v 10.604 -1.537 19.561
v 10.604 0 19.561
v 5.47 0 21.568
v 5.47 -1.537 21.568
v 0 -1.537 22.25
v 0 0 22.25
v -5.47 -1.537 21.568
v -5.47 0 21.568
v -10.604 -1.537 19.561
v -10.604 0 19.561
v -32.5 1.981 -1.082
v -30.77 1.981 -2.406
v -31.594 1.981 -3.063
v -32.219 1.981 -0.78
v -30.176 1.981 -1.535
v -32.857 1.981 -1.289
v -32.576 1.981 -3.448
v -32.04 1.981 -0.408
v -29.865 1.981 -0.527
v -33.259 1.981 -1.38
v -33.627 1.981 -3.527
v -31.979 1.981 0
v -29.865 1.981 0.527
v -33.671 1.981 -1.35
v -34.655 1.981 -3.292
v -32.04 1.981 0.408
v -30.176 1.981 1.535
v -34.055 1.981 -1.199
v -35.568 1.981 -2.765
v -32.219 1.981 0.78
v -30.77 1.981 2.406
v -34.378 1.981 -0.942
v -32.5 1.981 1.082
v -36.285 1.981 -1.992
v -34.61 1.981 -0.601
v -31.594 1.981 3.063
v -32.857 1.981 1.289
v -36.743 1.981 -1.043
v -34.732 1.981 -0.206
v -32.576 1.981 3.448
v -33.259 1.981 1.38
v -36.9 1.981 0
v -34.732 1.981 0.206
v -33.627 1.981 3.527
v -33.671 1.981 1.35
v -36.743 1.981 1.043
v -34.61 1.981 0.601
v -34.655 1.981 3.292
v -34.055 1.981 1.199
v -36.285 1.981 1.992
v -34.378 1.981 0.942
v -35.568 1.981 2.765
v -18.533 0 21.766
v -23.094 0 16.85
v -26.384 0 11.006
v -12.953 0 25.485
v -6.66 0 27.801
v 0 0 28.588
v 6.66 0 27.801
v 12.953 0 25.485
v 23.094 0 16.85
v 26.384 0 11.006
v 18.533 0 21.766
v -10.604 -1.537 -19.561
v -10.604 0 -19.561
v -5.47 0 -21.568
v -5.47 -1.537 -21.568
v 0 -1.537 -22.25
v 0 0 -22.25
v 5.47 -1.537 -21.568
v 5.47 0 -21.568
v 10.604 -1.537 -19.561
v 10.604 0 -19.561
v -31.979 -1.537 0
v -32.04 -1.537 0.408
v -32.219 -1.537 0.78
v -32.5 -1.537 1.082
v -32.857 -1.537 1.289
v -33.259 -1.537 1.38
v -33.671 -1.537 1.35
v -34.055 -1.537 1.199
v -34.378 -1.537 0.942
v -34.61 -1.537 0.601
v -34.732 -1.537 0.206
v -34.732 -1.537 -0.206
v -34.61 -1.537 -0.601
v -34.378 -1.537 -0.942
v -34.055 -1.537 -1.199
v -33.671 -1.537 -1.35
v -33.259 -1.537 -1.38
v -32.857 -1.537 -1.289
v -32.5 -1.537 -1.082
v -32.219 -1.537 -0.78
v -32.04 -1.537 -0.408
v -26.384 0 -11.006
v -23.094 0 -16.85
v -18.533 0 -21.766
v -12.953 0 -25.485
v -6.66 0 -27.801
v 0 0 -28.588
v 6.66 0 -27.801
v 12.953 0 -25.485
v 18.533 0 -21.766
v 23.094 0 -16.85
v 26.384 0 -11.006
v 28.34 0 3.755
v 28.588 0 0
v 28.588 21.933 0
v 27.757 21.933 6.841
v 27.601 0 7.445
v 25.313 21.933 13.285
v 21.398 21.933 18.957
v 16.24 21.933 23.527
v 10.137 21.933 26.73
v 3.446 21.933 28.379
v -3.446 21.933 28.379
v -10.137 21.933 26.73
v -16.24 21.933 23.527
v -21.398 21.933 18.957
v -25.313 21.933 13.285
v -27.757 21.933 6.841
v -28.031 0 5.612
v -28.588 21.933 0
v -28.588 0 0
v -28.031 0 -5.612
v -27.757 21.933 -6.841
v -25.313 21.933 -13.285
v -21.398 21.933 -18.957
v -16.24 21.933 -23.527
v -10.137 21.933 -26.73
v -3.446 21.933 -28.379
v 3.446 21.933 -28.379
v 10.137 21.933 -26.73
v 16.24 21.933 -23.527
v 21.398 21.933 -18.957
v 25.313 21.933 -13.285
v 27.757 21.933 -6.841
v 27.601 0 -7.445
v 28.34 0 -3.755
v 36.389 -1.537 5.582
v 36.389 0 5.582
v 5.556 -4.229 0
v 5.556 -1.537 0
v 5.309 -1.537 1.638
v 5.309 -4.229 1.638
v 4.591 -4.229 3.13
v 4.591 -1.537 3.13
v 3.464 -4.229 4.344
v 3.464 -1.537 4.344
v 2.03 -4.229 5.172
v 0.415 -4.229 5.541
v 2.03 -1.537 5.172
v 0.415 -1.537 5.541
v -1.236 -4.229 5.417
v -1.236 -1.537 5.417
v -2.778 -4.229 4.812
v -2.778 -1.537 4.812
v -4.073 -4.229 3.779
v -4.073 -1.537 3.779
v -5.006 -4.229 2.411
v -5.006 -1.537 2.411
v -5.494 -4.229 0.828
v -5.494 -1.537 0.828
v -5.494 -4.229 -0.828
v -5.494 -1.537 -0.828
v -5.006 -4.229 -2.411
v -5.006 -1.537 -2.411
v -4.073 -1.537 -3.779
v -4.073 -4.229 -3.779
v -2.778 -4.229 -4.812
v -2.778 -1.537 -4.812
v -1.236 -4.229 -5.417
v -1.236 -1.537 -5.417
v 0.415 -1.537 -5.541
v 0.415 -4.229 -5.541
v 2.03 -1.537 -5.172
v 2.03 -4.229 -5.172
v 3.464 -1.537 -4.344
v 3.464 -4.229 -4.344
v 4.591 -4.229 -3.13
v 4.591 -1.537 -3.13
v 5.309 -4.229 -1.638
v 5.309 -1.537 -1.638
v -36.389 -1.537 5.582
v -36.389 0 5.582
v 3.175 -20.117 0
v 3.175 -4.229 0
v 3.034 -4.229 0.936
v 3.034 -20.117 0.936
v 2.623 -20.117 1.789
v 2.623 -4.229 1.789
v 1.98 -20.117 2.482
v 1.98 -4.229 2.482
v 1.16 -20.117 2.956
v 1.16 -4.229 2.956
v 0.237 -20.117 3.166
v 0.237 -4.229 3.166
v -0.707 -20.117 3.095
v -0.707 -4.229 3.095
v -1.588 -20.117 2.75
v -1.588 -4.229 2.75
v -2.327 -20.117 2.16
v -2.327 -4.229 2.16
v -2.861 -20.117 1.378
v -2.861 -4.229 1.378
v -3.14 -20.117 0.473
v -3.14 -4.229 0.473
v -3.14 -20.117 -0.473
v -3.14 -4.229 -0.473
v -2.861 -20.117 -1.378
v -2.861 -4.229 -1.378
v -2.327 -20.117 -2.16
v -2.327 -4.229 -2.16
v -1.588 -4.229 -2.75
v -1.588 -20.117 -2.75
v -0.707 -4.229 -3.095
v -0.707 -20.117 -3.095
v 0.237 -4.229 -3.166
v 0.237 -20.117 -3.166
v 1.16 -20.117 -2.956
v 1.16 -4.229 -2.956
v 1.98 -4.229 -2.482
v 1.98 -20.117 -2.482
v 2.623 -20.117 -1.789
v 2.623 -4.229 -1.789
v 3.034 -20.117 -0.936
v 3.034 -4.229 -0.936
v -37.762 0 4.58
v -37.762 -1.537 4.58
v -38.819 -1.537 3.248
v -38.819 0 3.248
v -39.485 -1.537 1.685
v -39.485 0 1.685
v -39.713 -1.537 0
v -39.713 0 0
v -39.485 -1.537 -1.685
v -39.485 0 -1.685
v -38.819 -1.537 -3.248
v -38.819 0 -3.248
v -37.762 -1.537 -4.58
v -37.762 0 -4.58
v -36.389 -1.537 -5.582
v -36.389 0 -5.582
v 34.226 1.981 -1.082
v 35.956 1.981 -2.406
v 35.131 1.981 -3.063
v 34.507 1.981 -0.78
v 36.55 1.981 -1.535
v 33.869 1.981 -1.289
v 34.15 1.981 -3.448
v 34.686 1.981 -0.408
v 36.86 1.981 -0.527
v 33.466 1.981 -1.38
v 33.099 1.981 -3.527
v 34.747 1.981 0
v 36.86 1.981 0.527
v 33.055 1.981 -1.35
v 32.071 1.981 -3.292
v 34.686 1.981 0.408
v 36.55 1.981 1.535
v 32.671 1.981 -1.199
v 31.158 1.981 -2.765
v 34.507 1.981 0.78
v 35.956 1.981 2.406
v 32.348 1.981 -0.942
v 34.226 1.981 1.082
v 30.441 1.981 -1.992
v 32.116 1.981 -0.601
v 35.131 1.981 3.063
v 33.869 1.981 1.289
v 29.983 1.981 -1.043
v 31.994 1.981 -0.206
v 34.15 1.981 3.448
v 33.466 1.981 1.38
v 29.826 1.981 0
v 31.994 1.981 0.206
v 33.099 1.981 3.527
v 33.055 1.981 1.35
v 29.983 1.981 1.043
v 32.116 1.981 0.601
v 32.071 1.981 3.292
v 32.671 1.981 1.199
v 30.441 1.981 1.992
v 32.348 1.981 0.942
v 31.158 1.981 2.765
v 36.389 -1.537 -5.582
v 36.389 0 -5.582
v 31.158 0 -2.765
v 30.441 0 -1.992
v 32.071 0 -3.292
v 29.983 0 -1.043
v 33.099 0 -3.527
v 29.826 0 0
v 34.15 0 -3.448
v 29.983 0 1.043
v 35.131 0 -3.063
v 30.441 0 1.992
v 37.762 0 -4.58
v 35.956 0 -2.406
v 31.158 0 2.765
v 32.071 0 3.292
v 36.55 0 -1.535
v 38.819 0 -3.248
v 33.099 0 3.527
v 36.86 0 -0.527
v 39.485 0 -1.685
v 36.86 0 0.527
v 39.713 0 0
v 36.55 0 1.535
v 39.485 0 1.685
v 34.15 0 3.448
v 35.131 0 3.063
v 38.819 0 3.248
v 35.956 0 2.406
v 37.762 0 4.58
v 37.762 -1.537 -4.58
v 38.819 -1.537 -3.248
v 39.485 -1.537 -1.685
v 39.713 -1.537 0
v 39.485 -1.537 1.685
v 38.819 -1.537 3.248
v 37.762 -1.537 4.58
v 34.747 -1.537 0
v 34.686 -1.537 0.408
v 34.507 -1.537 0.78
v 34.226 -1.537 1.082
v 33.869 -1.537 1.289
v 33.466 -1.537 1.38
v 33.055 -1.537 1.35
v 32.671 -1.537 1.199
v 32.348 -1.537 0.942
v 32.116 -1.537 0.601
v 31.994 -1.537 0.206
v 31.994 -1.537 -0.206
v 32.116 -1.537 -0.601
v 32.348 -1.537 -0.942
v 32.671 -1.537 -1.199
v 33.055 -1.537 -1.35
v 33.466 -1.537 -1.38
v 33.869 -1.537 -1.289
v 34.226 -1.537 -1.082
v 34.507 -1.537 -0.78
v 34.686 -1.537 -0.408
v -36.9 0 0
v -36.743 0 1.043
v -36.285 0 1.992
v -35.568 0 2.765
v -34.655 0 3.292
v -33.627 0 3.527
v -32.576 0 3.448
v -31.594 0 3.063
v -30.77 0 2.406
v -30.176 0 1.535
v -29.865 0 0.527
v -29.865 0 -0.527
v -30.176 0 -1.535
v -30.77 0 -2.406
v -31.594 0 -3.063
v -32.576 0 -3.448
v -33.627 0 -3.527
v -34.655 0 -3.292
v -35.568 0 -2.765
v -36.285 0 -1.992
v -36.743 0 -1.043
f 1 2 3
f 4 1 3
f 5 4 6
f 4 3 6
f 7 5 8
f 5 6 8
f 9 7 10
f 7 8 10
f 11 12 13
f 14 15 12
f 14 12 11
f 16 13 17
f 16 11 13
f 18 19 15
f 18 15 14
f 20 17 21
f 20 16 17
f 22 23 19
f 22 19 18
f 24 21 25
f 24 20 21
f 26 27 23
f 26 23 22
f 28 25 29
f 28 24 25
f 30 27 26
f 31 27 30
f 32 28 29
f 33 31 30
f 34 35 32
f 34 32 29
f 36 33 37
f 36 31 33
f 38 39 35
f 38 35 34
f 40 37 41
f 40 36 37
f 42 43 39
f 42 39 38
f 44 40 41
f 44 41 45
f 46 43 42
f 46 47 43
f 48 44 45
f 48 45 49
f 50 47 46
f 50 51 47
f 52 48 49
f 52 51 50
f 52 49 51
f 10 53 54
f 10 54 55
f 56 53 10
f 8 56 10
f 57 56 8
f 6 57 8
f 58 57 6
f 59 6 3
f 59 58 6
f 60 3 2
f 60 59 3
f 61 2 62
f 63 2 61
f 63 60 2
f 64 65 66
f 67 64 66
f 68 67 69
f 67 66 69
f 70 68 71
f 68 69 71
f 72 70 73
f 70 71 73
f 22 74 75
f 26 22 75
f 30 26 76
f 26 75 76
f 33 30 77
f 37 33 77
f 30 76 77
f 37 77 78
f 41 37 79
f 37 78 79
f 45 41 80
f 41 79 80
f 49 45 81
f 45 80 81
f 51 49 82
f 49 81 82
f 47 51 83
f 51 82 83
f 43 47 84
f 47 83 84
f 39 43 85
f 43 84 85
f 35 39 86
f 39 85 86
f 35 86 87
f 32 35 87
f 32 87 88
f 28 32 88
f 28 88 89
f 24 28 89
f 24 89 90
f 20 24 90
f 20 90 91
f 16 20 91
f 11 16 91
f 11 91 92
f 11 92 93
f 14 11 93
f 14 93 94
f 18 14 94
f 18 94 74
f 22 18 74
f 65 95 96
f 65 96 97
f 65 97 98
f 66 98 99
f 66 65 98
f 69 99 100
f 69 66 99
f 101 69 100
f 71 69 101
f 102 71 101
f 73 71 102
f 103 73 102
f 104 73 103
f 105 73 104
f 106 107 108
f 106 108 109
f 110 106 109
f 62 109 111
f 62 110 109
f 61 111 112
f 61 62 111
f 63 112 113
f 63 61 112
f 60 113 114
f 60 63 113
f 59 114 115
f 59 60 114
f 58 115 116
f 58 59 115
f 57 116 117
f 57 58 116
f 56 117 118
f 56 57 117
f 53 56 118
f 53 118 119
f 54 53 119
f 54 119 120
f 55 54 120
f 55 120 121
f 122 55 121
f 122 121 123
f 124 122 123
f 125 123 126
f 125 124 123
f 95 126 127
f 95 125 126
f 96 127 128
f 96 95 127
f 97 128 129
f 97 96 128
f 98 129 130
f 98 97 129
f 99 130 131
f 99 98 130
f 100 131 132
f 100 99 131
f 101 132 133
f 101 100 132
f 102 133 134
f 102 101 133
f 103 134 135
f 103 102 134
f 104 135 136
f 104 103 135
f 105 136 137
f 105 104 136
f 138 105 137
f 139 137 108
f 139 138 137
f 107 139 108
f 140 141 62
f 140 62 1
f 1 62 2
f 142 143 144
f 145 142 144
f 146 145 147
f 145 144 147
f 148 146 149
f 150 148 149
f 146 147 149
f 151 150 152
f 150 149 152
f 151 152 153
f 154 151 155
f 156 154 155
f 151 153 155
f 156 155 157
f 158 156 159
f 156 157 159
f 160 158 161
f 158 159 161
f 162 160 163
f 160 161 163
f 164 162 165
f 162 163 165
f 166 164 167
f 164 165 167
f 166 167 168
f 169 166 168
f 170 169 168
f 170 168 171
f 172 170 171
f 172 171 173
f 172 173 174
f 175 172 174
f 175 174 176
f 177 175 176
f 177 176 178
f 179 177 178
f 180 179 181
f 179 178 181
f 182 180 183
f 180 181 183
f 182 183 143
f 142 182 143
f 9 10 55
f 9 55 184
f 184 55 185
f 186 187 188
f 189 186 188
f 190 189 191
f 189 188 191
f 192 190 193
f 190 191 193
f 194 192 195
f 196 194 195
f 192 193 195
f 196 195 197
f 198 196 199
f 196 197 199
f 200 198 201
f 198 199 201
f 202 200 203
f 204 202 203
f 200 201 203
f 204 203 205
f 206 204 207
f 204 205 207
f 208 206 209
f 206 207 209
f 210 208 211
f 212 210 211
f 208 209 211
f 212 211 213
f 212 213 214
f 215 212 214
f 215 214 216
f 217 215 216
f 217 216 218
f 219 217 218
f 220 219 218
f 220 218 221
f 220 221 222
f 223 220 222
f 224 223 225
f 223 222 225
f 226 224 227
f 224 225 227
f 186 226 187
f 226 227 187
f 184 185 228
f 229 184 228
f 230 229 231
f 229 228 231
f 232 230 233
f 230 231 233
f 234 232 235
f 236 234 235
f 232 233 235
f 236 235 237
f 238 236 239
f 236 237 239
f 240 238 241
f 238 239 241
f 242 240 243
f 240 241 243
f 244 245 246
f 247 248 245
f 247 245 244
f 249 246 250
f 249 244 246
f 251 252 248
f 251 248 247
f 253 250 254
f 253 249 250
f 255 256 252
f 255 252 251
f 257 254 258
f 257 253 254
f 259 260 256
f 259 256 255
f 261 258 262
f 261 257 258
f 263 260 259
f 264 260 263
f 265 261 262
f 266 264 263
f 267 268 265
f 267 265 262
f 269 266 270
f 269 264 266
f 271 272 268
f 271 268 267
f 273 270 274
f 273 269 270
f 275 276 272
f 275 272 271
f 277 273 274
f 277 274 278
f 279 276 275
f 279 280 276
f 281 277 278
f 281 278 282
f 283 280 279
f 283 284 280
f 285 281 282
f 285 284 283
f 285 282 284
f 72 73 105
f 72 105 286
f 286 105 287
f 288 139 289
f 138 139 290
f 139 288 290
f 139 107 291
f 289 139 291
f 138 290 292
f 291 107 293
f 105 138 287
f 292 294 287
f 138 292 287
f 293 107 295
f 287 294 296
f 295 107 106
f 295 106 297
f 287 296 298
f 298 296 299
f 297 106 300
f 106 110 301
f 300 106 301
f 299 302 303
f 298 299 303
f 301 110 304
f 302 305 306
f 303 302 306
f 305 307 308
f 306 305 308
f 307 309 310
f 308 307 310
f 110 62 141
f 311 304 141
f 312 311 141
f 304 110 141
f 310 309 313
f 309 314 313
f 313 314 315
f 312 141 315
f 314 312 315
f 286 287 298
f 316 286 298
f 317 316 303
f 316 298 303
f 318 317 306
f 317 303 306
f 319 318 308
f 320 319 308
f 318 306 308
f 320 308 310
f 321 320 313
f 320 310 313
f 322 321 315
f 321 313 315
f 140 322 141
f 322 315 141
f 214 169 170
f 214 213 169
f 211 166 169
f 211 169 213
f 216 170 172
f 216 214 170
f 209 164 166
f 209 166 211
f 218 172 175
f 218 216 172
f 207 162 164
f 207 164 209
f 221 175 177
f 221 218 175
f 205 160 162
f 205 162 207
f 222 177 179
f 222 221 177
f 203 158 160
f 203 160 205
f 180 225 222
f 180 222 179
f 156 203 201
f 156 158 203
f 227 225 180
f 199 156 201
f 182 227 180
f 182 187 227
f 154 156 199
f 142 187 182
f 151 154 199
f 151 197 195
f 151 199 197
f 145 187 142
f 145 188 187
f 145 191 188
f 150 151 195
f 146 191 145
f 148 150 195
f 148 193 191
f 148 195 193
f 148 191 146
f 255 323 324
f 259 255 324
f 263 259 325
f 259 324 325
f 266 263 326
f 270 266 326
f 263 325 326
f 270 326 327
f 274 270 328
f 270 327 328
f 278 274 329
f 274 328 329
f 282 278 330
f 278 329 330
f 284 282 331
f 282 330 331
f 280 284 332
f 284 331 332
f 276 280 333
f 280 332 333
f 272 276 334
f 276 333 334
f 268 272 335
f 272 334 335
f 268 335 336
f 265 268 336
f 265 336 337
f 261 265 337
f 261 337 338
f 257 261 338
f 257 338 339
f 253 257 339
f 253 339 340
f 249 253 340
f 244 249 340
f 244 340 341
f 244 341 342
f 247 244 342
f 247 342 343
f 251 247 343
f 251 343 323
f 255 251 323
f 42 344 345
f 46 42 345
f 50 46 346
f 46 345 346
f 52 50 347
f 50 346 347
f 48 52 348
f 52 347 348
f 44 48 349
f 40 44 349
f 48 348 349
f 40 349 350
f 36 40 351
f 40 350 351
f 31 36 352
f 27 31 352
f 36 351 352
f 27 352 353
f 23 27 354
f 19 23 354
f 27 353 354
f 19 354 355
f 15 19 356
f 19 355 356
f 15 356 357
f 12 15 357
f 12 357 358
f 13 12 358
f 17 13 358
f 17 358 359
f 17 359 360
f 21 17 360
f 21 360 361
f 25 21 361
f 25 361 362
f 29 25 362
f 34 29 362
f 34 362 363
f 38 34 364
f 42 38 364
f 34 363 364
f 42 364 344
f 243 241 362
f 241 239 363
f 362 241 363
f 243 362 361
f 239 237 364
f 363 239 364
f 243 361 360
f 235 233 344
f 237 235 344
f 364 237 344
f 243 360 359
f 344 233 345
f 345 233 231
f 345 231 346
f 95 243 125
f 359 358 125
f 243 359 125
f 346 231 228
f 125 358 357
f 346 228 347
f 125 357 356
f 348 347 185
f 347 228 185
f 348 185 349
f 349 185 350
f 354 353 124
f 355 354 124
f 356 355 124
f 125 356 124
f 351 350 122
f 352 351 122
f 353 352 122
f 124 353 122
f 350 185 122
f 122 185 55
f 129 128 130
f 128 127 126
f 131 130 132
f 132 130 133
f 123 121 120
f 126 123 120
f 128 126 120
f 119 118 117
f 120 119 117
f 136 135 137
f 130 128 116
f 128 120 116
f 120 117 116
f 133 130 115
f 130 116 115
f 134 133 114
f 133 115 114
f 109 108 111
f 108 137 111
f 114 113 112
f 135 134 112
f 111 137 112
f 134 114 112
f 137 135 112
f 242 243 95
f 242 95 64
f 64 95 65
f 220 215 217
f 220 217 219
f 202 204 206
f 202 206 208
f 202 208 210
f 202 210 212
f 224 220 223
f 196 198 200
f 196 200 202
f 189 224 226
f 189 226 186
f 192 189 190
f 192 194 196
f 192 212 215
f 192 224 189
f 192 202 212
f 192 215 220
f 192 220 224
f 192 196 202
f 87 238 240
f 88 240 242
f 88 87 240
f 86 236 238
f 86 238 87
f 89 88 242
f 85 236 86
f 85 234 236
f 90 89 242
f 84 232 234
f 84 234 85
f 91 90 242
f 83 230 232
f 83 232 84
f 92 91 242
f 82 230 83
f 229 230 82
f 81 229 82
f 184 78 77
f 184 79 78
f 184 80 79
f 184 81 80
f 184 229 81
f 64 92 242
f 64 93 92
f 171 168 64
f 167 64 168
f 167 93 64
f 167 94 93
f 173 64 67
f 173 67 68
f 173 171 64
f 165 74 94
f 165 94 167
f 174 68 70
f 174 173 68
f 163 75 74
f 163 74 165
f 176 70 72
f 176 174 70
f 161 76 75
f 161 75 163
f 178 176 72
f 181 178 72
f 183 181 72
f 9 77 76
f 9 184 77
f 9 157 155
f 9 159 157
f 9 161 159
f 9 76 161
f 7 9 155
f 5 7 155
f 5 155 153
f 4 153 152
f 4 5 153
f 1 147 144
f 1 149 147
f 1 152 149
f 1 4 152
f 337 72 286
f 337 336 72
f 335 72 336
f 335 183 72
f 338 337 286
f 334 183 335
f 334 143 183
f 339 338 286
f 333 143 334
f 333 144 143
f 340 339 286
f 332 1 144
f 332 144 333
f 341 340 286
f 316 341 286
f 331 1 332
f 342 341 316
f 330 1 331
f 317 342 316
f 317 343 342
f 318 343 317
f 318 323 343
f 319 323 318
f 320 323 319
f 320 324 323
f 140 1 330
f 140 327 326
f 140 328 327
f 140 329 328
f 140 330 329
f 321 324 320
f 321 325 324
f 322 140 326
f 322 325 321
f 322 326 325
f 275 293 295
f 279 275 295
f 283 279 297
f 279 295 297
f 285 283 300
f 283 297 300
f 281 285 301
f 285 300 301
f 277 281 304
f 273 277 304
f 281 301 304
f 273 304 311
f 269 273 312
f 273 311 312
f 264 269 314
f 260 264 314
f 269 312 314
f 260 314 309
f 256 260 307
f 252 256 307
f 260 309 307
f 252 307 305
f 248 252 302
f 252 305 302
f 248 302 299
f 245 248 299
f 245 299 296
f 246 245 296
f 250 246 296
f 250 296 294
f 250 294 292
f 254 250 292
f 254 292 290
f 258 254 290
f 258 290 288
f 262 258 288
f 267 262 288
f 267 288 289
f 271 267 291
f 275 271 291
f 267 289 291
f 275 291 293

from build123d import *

# Parameters (mm, degrees)
F0_R      = 28.5877
F1_DEPTH  = 21.9329
F3_DEPTH  = 1.5367
F4_R      = 5.55625
F5_DEPTH  = 2.6924
F6_R      = 3.175
F7_DEPTH  = 15.8877
F8_R      = 3.53695
F9_DEPTH  = 1.9812
F10_R     = 1.3843
F11_DEPTH = 23.4706


with BuildPart() as f1:
    # F0 (on Front) → F1 (new body)
    with BuildSketch(Plane.XZ):
        Circle(F0_R)
    extrude(amount=-F1_DEPTH)

    # F2 (on face) → F3 (join)
    with BuildSketch(Plane.XZ):
        with BuildLine():
            Line((-10.604302, 19.560907), (-36.389242, 5.582451))
            ThreePointArc((-36.389242, 5.582451), (-39.7129, 0), (-36.389242, -5.582451))
            Line((-36.389242, -5.582451), (-10.604302, -19.560907))
            ThreePointArc((-10.604302, -19.560907), (0, -22.2504), (10.604302, -19.560907))
            Line((10.604302, -19.560907), (36.389242, -5.582451))
            ThreePointArc((36.389242, -5.582451), (39.7129, 0), (36.389242, 5.582451))
            Line((36.389242, 5.582451), (10.604302, 19.560907))
            ThreePointArc((10.604302, 19.560907), (0, 22.2504), (-10.604302, 19.560907))
        make_face()
    extrude(amount=F3_DEPTH)

    # F4 (on face) → F5 (join)
    with BuildSketch(Plane.XZ.offset(1.5367)):
        Circle(F4_R)
    extrude(amount=F5_DEPTH)

    # F6 (on face) → F7 (join)
    with BuildSketch(Plane.XZ.offset(4.2291)):
        Circle(F6_R)
    extrude(amount=F7_DEPTH)

    # F8 (on face) → F9 (join)
    with BuildSketch(Plane(origin=(0, 0, 0), x_dir=(-1, 0, 0), z_dir=(0, 1, 0))):
        with Locations((-33.3629, 0)):
            Circle(F8_R)
        with Locations((33.3629, 0)):
            Circle(F8_R)
    extrude(amount=F9_DEPTH)

    # F10 (on face) → F11 (cut, through all)
    with BuildSketch(Plane.XZ.offset(1.5367)):
        with Locations((33.3629, 0)):
            Circle(F10_R)
        with Locations((-33.3629, 0)):
            Circle(F10_R)
    extrude(amount=-F11_DEPTH, mode=Mode.SUBTRACT)


solid = f1.part
